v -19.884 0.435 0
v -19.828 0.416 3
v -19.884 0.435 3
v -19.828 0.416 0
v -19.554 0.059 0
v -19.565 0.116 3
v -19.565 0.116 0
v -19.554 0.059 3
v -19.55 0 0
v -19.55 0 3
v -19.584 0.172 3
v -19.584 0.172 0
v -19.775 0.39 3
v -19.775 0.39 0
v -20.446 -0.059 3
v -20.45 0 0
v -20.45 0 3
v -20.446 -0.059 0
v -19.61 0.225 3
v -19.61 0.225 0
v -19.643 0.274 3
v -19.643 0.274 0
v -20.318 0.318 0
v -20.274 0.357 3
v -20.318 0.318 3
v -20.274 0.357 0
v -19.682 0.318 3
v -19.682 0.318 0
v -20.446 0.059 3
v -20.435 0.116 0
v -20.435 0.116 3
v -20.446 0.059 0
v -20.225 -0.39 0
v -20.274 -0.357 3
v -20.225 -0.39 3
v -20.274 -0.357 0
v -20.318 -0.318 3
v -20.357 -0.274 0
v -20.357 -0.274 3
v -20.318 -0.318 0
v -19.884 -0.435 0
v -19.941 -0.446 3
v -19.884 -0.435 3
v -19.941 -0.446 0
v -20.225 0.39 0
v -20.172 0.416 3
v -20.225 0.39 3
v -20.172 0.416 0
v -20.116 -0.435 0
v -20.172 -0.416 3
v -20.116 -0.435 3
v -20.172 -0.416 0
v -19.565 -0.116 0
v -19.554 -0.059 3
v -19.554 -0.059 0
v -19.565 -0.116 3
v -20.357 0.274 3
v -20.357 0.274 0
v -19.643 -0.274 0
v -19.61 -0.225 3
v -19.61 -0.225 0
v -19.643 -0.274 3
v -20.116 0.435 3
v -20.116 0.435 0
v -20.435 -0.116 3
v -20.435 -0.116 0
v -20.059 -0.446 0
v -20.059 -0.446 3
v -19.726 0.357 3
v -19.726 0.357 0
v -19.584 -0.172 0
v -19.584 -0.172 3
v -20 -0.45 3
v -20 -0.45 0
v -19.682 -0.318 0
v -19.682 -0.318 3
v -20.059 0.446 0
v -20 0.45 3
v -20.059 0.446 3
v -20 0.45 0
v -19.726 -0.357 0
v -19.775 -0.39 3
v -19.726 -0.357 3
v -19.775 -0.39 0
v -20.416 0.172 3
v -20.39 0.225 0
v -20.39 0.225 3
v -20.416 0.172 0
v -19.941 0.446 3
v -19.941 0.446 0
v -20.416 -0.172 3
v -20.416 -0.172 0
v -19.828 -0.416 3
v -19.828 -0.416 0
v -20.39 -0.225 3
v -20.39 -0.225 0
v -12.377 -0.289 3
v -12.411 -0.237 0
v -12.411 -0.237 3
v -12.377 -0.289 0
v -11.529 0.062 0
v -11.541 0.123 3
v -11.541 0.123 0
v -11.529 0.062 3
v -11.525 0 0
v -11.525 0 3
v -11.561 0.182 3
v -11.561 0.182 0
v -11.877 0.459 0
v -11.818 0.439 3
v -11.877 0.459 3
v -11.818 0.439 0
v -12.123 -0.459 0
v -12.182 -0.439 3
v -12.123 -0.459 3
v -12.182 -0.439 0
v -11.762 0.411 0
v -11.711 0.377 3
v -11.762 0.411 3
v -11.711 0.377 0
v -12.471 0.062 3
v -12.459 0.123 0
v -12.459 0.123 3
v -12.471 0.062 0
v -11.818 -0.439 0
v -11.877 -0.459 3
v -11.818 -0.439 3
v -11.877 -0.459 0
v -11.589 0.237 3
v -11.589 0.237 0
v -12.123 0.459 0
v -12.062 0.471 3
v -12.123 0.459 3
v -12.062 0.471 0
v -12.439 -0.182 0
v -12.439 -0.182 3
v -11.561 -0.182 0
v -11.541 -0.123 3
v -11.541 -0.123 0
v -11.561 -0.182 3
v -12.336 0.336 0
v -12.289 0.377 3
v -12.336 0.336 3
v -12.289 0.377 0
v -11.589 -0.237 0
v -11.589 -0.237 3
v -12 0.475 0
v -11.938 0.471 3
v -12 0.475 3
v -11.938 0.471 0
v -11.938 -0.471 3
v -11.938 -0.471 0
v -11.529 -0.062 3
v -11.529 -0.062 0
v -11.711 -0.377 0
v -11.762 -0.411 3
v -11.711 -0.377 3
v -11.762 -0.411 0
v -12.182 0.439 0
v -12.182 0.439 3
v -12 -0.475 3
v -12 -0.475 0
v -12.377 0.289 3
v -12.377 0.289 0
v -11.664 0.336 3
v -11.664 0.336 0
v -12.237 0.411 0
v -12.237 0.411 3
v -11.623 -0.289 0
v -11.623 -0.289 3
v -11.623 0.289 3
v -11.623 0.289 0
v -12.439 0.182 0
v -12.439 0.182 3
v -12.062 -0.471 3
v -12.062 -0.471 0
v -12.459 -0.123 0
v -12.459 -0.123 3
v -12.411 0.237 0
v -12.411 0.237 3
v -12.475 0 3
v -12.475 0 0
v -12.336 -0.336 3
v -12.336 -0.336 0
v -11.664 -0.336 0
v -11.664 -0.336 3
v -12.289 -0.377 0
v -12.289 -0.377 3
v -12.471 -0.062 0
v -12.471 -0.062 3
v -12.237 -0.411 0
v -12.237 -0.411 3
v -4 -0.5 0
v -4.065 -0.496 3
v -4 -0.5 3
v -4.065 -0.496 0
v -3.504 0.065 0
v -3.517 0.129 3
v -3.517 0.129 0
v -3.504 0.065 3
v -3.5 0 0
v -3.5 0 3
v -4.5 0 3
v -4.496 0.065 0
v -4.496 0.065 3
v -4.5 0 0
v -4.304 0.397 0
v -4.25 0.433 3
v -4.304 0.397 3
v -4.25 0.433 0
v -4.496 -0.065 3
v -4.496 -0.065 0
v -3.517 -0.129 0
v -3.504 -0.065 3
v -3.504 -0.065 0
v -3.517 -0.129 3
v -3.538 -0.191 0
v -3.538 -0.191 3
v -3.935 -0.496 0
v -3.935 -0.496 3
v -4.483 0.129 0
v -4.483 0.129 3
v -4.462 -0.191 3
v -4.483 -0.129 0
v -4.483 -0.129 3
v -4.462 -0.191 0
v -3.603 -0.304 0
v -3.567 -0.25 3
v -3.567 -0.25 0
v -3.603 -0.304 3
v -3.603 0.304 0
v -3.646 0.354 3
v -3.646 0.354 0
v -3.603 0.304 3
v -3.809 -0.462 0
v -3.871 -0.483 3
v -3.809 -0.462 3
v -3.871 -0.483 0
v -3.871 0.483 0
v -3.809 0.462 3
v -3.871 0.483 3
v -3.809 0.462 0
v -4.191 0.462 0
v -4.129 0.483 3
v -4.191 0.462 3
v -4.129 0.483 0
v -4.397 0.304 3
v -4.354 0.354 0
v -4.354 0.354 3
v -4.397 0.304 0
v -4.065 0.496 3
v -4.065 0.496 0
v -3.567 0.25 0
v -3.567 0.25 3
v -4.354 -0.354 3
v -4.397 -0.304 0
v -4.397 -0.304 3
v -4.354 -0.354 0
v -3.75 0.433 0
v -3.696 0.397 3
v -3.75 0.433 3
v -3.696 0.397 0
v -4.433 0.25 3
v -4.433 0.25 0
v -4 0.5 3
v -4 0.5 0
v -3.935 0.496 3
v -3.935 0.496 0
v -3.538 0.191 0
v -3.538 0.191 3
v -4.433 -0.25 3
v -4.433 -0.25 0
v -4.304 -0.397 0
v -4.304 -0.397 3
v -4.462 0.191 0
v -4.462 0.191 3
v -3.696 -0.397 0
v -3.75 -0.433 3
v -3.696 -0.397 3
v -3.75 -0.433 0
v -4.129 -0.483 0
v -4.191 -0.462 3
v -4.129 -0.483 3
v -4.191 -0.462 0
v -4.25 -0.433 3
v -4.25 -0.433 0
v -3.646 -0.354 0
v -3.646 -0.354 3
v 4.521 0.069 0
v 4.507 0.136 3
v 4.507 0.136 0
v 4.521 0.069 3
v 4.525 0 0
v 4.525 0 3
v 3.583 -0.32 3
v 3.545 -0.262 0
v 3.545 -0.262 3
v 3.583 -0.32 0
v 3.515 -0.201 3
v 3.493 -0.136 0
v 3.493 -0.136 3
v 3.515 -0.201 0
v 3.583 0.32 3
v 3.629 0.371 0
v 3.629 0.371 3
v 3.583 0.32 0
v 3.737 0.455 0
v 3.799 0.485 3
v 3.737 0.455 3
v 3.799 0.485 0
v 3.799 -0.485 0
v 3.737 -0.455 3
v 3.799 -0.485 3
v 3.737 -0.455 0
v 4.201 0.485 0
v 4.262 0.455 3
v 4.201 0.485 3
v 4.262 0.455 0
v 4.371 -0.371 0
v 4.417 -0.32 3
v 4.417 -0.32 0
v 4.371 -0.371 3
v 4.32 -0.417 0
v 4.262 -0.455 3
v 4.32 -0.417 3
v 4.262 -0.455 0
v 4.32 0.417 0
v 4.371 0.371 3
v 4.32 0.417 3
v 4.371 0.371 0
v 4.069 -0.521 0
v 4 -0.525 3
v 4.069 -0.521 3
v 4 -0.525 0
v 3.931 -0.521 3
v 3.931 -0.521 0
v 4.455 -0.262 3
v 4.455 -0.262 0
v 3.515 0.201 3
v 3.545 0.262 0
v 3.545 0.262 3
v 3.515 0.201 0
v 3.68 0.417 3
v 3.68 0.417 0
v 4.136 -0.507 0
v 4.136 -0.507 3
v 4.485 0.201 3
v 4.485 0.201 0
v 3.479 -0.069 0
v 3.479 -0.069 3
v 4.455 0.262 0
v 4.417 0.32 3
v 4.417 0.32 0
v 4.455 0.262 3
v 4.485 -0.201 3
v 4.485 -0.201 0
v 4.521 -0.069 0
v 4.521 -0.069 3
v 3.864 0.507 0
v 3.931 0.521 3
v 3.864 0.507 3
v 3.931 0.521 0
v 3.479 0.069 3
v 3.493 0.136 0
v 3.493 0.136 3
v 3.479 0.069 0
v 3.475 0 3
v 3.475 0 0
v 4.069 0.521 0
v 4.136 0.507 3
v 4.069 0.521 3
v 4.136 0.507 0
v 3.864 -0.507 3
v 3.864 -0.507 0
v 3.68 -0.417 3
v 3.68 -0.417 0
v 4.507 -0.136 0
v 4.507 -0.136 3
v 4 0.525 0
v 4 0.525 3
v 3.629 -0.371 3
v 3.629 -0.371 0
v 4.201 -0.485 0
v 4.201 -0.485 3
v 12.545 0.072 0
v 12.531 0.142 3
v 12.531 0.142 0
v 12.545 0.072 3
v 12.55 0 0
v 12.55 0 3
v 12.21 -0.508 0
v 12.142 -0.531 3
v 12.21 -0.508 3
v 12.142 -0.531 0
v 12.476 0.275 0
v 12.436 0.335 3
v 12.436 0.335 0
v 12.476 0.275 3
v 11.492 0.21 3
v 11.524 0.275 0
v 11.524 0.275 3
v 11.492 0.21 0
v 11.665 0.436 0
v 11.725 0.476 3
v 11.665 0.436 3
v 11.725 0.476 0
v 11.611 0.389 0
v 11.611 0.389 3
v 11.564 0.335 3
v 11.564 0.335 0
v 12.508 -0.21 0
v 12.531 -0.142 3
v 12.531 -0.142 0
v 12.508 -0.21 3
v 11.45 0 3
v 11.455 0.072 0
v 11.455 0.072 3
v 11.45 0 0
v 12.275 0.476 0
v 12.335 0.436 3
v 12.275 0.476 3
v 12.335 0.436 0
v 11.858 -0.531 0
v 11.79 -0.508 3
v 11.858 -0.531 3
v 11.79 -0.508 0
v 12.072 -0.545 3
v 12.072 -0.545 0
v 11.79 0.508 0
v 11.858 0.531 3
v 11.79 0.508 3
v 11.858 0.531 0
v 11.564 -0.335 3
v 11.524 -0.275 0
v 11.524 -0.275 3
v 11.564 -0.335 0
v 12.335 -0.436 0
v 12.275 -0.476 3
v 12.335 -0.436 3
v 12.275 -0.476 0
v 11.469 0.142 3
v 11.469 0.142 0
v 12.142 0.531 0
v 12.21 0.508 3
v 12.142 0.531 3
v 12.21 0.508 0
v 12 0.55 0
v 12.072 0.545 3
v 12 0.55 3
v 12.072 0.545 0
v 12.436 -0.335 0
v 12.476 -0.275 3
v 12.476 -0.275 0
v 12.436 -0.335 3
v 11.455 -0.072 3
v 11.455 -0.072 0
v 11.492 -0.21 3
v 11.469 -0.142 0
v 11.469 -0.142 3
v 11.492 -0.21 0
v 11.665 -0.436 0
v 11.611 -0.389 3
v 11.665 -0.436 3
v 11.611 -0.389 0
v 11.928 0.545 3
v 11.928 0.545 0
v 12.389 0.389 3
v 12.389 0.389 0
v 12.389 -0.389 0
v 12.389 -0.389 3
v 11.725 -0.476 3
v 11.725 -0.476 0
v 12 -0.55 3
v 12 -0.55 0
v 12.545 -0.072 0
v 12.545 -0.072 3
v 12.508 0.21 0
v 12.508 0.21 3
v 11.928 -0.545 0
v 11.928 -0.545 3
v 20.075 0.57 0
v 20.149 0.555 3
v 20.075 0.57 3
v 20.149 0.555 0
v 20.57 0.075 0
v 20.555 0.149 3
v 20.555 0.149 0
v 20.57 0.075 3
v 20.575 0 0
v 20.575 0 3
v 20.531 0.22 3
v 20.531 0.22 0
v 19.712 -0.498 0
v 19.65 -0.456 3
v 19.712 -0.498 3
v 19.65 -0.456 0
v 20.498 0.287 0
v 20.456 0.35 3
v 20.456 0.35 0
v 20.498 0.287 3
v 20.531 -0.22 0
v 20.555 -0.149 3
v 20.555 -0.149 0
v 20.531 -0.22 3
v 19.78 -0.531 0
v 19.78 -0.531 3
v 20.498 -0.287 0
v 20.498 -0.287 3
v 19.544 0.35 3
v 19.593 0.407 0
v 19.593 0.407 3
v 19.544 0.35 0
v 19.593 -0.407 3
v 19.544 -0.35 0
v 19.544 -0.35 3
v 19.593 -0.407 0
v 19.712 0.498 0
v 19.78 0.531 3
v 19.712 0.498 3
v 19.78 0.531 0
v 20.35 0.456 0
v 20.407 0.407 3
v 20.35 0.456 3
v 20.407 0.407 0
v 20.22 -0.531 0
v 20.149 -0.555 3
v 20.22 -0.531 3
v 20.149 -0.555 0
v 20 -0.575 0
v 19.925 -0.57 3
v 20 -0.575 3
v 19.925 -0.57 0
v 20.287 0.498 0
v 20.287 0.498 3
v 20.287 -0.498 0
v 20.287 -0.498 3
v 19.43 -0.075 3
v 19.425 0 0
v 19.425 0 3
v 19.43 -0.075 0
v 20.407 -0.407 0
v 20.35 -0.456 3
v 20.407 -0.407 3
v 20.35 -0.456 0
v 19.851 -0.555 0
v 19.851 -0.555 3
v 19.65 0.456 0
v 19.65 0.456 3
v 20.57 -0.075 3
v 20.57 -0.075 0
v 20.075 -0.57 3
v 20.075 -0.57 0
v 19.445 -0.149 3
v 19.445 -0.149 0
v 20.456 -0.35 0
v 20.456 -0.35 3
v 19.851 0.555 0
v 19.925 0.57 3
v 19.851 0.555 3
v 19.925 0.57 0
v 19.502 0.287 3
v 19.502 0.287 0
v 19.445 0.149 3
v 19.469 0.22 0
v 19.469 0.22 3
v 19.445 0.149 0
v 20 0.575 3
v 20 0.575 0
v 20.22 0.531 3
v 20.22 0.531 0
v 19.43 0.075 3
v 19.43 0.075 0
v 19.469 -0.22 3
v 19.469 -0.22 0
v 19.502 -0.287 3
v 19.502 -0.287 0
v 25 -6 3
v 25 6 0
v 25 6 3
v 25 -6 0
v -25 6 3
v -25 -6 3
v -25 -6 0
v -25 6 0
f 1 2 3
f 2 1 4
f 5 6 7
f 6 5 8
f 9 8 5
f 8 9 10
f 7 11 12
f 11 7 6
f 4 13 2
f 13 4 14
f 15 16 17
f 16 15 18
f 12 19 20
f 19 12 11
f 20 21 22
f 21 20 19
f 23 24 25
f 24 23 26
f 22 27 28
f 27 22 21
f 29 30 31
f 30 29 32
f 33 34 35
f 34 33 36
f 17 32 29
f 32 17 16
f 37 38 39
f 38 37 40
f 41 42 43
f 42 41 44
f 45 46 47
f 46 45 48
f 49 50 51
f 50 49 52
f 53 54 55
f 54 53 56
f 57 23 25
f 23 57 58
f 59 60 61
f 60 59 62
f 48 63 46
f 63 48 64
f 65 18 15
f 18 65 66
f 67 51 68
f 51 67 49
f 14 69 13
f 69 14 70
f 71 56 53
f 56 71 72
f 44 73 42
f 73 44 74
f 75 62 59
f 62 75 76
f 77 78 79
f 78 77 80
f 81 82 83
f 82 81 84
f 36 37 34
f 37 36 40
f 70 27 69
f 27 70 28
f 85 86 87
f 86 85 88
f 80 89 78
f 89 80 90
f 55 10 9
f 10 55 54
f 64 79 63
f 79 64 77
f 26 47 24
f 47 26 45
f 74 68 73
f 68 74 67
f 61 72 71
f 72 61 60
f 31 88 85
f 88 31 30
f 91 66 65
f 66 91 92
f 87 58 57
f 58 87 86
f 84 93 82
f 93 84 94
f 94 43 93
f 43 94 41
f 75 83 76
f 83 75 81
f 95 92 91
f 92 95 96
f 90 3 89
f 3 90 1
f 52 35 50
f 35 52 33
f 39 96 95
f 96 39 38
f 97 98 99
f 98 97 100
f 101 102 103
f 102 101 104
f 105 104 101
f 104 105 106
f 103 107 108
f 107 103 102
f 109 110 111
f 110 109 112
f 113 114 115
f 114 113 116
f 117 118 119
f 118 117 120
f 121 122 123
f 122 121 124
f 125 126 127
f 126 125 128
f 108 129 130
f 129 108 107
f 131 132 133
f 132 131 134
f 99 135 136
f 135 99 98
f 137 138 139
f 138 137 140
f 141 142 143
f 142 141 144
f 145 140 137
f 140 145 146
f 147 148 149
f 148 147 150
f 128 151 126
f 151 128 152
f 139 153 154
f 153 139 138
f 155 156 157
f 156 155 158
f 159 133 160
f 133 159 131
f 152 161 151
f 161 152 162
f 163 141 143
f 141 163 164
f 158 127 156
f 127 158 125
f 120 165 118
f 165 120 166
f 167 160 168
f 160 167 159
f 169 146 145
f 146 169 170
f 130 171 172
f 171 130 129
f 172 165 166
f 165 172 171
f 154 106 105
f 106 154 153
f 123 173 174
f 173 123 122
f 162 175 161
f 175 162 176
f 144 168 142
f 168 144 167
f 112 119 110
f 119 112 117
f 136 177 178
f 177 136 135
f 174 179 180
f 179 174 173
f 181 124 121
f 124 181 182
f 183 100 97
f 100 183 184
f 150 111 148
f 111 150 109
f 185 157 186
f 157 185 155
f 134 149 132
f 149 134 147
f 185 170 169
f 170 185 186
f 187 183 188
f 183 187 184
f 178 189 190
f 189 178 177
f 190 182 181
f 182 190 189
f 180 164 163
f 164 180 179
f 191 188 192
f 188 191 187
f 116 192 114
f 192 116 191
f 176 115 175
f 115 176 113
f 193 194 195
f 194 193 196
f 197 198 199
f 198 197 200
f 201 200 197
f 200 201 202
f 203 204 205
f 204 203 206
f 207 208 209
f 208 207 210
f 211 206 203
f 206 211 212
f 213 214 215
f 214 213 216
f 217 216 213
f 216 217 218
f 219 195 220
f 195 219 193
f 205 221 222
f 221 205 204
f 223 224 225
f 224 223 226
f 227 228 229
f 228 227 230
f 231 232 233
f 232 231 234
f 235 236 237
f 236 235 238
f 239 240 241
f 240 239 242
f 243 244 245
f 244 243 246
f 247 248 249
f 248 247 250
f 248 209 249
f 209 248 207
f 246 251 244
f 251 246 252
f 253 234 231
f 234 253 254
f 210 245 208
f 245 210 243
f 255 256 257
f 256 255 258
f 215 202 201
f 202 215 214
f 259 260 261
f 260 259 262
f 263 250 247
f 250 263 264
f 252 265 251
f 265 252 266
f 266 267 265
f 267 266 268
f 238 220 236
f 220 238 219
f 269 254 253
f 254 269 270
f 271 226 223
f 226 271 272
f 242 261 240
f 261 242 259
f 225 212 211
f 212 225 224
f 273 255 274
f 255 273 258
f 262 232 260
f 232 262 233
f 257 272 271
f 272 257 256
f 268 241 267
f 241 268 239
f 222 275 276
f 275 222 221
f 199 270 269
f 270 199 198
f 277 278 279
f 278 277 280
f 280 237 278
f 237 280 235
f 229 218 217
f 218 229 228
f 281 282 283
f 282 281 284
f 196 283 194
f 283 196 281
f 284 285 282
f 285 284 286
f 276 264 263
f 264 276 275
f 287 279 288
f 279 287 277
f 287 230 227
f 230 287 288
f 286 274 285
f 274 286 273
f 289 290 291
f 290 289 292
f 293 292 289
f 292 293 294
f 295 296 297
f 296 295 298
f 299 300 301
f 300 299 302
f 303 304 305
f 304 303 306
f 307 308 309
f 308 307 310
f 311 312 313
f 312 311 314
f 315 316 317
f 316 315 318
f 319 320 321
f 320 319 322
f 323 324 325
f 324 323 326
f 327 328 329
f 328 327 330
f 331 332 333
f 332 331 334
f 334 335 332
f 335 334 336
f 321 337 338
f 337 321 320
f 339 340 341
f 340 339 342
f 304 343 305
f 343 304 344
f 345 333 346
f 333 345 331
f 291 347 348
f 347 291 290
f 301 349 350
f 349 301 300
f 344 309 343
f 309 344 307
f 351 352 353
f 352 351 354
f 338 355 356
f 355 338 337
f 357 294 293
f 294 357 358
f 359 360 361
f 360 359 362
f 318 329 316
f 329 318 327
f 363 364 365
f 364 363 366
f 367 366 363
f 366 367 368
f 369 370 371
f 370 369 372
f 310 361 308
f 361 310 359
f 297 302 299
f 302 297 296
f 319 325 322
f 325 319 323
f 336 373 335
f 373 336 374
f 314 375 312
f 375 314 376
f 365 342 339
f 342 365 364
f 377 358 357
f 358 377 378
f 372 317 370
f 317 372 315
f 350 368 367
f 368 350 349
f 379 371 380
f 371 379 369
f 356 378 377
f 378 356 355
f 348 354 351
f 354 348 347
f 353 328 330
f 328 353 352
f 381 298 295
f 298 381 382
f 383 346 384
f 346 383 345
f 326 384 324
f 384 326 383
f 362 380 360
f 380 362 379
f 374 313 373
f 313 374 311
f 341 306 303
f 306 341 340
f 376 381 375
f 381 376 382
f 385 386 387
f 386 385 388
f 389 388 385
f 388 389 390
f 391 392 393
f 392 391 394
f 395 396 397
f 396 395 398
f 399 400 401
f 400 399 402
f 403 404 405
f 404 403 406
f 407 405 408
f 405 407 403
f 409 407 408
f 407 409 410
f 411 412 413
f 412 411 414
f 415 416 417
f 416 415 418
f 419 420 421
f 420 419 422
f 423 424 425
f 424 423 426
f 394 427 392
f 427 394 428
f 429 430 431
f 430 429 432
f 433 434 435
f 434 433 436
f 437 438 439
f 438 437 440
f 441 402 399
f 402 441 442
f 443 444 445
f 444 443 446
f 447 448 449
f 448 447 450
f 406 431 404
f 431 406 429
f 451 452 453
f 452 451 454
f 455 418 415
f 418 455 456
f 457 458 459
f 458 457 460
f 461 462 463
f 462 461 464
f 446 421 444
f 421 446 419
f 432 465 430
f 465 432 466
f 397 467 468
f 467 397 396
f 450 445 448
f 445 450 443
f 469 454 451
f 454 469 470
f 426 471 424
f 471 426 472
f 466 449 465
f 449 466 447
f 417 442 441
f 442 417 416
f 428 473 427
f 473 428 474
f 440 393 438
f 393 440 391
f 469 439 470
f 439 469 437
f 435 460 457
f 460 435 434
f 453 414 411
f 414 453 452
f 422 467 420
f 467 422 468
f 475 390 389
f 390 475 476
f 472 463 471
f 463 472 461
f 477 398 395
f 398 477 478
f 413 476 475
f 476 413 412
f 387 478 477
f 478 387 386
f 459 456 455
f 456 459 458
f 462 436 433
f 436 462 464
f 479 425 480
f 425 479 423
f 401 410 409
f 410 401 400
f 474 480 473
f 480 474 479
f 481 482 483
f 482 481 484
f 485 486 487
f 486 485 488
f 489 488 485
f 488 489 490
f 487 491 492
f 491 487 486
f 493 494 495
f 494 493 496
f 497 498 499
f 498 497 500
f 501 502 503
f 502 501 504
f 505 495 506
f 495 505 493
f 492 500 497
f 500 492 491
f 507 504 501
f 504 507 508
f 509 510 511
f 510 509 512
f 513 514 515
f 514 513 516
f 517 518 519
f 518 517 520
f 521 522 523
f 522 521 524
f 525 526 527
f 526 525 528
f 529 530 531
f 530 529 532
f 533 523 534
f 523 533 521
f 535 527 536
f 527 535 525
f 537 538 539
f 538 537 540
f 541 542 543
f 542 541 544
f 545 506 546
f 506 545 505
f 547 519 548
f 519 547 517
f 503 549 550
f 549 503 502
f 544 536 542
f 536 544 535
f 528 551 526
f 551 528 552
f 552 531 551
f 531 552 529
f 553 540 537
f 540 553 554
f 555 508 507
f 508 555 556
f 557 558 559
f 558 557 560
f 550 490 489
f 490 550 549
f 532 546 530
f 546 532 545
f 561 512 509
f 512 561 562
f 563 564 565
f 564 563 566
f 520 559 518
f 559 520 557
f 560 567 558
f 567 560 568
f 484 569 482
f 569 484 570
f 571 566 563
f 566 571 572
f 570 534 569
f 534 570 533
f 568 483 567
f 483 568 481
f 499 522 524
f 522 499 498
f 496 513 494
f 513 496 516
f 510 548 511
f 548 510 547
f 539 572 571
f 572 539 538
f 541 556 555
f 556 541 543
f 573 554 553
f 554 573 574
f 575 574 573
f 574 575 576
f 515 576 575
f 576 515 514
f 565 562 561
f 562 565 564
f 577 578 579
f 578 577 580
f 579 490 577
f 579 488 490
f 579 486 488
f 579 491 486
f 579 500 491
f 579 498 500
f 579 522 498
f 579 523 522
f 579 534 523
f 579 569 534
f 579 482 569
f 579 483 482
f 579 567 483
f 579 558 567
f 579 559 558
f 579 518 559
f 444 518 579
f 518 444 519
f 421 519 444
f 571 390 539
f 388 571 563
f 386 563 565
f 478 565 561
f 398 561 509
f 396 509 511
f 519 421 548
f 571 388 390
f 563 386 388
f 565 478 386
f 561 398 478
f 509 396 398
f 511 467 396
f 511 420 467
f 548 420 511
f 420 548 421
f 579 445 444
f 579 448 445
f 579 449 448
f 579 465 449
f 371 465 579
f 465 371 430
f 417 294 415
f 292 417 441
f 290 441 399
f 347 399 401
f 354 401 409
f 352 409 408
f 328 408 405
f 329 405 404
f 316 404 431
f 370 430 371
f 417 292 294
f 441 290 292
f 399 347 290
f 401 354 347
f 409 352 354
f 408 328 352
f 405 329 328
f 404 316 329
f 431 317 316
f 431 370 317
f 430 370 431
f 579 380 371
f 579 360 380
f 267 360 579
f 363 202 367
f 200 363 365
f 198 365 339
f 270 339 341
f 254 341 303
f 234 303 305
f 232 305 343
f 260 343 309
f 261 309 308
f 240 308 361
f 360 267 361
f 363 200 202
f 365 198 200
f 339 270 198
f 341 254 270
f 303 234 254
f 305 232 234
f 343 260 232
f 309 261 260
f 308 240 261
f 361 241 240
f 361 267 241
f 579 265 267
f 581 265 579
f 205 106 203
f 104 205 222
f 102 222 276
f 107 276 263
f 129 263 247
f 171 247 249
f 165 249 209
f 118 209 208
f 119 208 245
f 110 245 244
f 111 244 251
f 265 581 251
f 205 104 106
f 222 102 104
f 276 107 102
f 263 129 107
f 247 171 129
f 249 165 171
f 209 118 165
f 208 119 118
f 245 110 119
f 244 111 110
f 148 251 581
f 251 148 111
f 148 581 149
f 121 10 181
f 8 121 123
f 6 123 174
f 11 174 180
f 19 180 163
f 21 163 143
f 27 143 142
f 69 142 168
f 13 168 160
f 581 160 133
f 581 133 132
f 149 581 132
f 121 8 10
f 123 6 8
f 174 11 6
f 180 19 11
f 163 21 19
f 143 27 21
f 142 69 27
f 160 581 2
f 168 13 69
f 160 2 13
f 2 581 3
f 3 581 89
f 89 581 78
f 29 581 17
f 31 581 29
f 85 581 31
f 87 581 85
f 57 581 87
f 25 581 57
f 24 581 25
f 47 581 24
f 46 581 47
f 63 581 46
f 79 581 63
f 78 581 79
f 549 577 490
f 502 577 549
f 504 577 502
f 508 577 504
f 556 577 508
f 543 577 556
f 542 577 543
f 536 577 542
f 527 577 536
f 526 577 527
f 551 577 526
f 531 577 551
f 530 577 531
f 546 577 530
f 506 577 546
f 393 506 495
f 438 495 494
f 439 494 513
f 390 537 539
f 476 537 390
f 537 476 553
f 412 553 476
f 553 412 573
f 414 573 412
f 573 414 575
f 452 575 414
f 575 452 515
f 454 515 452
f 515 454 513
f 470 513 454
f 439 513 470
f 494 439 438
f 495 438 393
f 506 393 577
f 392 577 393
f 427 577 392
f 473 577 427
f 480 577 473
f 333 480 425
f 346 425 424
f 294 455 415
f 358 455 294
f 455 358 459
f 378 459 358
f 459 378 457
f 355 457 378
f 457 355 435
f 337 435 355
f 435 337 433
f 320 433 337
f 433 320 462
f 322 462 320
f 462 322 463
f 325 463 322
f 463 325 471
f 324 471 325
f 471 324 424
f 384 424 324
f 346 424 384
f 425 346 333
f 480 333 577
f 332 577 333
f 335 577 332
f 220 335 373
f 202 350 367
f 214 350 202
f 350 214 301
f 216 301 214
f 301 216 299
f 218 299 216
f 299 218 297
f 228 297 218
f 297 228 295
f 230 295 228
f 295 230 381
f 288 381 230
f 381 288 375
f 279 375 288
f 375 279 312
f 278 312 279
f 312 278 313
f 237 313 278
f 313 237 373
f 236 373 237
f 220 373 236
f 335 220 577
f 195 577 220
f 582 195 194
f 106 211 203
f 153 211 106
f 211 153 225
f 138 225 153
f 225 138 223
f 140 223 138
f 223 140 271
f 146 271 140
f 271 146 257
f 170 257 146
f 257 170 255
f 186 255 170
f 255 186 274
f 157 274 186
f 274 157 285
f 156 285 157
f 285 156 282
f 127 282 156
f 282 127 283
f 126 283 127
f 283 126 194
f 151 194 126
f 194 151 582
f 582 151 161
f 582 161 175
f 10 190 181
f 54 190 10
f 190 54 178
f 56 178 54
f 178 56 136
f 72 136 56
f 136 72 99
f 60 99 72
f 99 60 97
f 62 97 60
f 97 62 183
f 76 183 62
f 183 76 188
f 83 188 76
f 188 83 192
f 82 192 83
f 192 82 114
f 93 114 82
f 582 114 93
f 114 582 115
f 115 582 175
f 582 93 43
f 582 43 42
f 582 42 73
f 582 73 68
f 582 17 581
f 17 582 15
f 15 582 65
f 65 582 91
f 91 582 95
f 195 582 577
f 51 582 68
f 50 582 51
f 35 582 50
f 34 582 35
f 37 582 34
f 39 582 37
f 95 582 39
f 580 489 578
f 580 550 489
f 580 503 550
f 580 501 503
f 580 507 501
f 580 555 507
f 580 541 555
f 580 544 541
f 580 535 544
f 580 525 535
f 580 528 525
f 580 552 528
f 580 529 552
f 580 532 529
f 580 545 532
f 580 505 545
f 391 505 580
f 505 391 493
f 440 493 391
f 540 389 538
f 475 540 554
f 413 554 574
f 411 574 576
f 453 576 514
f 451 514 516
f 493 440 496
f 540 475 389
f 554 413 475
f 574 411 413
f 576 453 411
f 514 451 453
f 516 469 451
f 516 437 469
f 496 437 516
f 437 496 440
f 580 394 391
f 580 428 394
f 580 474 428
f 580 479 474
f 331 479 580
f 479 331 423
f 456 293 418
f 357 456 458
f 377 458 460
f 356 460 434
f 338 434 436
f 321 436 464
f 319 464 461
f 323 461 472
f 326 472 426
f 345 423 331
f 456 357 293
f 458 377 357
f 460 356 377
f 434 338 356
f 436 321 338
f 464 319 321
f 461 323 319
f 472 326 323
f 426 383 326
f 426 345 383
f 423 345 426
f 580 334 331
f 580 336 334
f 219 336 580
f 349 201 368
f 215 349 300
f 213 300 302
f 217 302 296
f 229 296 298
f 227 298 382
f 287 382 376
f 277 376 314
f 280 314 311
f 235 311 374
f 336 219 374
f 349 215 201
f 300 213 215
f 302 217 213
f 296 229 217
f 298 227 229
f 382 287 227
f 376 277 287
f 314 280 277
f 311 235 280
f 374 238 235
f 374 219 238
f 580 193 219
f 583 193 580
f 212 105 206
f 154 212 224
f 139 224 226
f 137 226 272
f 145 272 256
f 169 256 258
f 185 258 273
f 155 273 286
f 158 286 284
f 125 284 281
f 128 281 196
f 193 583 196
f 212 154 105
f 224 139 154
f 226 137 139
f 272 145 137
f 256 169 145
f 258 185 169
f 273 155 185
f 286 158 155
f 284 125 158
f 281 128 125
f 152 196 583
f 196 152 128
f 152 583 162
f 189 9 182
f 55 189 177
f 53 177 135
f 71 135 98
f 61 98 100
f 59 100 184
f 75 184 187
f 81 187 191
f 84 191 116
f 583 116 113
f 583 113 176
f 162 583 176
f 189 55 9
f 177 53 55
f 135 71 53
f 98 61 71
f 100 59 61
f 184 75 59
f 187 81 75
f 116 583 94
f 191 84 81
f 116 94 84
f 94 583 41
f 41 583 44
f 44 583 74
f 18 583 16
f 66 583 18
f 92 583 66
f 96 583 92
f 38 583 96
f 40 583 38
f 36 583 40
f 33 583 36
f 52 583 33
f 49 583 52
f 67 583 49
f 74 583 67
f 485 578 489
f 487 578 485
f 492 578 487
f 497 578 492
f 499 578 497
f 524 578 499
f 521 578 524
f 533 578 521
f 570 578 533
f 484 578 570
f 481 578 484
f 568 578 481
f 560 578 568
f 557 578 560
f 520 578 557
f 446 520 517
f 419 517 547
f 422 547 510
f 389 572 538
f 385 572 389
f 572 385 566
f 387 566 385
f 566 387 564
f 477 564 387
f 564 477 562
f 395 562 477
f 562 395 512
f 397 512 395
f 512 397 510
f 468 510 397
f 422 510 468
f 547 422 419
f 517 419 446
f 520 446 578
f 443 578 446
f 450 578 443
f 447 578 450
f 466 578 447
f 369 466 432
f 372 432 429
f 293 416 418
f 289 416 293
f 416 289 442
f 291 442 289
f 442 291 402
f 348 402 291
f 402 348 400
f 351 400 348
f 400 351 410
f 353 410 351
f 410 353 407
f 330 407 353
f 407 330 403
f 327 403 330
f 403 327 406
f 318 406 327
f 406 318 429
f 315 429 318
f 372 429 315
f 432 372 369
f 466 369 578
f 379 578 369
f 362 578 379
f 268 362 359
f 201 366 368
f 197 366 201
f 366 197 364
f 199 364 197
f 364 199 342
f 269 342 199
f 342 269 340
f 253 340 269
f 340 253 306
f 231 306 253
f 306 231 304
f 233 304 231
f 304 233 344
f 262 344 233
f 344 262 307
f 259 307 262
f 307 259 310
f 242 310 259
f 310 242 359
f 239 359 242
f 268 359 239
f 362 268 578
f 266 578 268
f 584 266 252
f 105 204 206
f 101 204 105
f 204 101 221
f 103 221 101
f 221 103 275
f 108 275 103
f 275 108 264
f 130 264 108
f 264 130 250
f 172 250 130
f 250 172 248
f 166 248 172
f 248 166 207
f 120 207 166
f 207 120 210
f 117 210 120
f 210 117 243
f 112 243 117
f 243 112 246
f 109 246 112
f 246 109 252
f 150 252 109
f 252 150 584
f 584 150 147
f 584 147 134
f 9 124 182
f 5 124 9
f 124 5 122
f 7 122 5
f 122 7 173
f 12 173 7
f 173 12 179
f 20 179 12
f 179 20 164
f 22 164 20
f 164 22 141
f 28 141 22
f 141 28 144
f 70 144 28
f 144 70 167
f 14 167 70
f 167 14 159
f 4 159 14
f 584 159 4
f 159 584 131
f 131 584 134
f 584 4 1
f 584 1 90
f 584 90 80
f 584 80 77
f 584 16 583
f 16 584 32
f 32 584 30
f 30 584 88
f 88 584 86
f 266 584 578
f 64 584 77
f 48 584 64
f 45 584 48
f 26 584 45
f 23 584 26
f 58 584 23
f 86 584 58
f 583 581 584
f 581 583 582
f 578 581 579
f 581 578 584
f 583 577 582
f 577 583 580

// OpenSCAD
// 1 mm motor-shaft bore calibration coupon for IceDrone
// SPDX-License-Identifier: Apache-2.0
$fn = 48;

holes = [0.90, 0.95, 1.00, 1.05, 1.10, 1.15];
plate_h = 3.0;
spacing = 8.0;
margin = 5.0;

length_x = margin*2 + spacing*(len(holes)-1);
width_y  = 12.0;

difference() {
    translate([-length_x/2, -width_y/2, 0])
        cube([length_x, width_y, plate_h]);

    for (i=[0:len(holes)-1]) {
        x = -length_x/2 + margin + i*spacing;
        translate([x,0,-0.5]) cylinder(d=holes[i], h=plate_h+1);
    }
}
